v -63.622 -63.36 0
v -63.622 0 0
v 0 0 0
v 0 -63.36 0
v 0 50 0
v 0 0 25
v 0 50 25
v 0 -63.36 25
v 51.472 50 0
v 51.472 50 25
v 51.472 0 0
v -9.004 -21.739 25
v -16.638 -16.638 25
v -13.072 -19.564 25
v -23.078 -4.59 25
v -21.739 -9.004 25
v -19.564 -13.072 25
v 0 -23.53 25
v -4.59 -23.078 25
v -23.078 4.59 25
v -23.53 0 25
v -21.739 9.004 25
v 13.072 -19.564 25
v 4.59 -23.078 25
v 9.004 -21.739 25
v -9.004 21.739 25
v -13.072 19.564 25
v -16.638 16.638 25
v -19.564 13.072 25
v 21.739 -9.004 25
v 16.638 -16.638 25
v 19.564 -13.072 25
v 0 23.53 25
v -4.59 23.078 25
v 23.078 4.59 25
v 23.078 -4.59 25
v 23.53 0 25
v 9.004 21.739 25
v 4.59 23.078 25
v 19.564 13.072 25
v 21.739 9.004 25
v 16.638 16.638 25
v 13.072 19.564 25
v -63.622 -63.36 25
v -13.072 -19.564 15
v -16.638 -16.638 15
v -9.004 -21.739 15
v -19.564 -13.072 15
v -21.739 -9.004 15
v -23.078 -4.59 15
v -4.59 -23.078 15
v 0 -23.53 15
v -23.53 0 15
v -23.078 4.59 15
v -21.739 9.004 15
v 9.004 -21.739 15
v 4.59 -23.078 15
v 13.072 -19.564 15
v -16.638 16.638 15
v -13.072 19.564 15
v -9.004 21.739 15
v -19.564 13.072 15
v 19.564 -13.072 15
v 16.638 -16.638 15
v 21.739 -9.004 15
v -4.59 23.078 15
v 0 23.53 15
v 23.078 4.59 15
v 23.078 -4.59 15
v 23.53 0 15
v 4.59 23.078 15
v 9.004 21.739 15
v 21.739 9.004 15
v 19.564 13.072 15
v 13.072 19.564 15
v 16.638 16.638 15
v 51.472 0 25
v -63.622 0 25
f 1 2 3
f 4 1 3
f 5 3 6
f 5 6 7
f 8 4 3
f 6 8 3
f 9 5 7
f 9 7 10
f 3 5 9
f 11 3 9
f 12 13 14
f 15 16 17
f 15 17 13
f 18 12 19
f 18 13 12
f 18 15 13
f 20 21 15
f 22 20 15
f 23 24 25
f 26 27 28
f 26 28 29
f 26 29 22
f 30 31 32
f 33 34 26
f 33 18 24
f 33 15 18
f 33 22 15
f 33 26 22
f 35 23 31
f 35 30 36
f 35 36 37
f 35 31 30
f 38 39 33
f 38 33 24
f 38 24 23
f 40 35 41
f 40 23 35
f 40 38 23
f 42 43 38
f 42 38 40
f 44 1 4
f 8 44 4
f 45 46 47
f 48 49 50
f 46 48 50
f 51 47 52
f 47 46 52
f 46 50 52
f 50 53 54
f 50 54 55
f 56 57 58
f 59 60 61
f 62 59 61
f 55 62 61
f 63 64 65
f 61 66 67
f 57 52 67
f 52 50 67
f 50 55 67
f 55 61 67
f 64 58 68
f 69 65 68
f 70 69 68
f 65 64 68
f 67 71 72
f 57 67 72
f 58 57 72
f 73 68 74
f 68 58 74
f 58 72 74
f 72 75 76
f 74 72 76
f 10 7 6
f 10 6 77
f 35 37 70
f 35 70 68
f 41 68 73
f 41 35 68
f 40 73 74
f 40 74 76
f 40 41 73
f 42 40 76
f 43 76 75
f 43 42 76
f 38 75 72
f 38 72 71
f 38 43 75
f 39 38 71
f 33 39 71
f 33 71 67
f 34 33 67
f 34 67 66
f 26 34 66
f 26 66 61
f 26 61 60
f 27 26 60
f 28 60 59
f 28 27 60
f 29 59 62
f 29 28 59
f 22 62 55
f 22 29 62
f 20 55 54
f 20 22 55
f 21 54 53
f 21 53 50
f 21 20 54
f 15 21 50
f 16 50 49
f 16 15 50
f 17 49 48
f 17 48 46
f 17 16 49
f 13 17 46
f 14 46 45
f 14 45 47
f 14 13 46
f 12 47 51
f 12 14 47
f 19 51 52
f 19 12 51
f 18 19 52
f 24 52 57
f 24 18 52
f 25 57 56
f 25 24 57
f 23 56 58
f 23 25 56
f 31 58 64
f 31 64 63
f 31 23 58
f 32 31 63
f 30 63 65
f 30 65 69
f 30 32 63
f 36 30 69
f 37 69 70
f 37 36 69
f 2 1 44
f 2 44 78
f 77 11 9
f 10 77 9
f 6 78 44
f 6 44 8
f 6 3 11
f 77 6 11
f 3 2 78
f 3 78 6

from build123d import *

# Parameters (mm, degrees)
F0_W     = 63.6219605803
F0_H     = 63.3600354195
F1_DEPTH = 25
F0_W_2   = 51.4722249205
F0_H_2   = 50
F2_R     = 23.5297325909
F3_DEPTH = 10


with BuildPart() as f1:
    # F0 (on Top) → F1 (new body)
    with BuildSketch(Plane.XY):
        with Locations((-31.8109802902, -31.6800177097)):
            Rectangle(F0_W, F0_H)
    extrude(amount=F1_DEPTH)


with BuildPart() as f1b:
    # F0 (on Top) → F1, piece 2 (new body)
    with BuildSketch(Plane.XY):
        with Locations((25.7361124603, 25)):
            Rectangle(F0_W_2, F0_H_2)
    extrude(amount=F1_DEPTH)


with BuildPart() as f3:
    # F2 (on face) → F3 (new body)
    with BuildSketch(Plane.XY.offset(25)):
        Circle(F2_R)
    extrude(amount=-F3_DEPTH)


solid = Compound([f1.part, f1b.part, f3.part])
